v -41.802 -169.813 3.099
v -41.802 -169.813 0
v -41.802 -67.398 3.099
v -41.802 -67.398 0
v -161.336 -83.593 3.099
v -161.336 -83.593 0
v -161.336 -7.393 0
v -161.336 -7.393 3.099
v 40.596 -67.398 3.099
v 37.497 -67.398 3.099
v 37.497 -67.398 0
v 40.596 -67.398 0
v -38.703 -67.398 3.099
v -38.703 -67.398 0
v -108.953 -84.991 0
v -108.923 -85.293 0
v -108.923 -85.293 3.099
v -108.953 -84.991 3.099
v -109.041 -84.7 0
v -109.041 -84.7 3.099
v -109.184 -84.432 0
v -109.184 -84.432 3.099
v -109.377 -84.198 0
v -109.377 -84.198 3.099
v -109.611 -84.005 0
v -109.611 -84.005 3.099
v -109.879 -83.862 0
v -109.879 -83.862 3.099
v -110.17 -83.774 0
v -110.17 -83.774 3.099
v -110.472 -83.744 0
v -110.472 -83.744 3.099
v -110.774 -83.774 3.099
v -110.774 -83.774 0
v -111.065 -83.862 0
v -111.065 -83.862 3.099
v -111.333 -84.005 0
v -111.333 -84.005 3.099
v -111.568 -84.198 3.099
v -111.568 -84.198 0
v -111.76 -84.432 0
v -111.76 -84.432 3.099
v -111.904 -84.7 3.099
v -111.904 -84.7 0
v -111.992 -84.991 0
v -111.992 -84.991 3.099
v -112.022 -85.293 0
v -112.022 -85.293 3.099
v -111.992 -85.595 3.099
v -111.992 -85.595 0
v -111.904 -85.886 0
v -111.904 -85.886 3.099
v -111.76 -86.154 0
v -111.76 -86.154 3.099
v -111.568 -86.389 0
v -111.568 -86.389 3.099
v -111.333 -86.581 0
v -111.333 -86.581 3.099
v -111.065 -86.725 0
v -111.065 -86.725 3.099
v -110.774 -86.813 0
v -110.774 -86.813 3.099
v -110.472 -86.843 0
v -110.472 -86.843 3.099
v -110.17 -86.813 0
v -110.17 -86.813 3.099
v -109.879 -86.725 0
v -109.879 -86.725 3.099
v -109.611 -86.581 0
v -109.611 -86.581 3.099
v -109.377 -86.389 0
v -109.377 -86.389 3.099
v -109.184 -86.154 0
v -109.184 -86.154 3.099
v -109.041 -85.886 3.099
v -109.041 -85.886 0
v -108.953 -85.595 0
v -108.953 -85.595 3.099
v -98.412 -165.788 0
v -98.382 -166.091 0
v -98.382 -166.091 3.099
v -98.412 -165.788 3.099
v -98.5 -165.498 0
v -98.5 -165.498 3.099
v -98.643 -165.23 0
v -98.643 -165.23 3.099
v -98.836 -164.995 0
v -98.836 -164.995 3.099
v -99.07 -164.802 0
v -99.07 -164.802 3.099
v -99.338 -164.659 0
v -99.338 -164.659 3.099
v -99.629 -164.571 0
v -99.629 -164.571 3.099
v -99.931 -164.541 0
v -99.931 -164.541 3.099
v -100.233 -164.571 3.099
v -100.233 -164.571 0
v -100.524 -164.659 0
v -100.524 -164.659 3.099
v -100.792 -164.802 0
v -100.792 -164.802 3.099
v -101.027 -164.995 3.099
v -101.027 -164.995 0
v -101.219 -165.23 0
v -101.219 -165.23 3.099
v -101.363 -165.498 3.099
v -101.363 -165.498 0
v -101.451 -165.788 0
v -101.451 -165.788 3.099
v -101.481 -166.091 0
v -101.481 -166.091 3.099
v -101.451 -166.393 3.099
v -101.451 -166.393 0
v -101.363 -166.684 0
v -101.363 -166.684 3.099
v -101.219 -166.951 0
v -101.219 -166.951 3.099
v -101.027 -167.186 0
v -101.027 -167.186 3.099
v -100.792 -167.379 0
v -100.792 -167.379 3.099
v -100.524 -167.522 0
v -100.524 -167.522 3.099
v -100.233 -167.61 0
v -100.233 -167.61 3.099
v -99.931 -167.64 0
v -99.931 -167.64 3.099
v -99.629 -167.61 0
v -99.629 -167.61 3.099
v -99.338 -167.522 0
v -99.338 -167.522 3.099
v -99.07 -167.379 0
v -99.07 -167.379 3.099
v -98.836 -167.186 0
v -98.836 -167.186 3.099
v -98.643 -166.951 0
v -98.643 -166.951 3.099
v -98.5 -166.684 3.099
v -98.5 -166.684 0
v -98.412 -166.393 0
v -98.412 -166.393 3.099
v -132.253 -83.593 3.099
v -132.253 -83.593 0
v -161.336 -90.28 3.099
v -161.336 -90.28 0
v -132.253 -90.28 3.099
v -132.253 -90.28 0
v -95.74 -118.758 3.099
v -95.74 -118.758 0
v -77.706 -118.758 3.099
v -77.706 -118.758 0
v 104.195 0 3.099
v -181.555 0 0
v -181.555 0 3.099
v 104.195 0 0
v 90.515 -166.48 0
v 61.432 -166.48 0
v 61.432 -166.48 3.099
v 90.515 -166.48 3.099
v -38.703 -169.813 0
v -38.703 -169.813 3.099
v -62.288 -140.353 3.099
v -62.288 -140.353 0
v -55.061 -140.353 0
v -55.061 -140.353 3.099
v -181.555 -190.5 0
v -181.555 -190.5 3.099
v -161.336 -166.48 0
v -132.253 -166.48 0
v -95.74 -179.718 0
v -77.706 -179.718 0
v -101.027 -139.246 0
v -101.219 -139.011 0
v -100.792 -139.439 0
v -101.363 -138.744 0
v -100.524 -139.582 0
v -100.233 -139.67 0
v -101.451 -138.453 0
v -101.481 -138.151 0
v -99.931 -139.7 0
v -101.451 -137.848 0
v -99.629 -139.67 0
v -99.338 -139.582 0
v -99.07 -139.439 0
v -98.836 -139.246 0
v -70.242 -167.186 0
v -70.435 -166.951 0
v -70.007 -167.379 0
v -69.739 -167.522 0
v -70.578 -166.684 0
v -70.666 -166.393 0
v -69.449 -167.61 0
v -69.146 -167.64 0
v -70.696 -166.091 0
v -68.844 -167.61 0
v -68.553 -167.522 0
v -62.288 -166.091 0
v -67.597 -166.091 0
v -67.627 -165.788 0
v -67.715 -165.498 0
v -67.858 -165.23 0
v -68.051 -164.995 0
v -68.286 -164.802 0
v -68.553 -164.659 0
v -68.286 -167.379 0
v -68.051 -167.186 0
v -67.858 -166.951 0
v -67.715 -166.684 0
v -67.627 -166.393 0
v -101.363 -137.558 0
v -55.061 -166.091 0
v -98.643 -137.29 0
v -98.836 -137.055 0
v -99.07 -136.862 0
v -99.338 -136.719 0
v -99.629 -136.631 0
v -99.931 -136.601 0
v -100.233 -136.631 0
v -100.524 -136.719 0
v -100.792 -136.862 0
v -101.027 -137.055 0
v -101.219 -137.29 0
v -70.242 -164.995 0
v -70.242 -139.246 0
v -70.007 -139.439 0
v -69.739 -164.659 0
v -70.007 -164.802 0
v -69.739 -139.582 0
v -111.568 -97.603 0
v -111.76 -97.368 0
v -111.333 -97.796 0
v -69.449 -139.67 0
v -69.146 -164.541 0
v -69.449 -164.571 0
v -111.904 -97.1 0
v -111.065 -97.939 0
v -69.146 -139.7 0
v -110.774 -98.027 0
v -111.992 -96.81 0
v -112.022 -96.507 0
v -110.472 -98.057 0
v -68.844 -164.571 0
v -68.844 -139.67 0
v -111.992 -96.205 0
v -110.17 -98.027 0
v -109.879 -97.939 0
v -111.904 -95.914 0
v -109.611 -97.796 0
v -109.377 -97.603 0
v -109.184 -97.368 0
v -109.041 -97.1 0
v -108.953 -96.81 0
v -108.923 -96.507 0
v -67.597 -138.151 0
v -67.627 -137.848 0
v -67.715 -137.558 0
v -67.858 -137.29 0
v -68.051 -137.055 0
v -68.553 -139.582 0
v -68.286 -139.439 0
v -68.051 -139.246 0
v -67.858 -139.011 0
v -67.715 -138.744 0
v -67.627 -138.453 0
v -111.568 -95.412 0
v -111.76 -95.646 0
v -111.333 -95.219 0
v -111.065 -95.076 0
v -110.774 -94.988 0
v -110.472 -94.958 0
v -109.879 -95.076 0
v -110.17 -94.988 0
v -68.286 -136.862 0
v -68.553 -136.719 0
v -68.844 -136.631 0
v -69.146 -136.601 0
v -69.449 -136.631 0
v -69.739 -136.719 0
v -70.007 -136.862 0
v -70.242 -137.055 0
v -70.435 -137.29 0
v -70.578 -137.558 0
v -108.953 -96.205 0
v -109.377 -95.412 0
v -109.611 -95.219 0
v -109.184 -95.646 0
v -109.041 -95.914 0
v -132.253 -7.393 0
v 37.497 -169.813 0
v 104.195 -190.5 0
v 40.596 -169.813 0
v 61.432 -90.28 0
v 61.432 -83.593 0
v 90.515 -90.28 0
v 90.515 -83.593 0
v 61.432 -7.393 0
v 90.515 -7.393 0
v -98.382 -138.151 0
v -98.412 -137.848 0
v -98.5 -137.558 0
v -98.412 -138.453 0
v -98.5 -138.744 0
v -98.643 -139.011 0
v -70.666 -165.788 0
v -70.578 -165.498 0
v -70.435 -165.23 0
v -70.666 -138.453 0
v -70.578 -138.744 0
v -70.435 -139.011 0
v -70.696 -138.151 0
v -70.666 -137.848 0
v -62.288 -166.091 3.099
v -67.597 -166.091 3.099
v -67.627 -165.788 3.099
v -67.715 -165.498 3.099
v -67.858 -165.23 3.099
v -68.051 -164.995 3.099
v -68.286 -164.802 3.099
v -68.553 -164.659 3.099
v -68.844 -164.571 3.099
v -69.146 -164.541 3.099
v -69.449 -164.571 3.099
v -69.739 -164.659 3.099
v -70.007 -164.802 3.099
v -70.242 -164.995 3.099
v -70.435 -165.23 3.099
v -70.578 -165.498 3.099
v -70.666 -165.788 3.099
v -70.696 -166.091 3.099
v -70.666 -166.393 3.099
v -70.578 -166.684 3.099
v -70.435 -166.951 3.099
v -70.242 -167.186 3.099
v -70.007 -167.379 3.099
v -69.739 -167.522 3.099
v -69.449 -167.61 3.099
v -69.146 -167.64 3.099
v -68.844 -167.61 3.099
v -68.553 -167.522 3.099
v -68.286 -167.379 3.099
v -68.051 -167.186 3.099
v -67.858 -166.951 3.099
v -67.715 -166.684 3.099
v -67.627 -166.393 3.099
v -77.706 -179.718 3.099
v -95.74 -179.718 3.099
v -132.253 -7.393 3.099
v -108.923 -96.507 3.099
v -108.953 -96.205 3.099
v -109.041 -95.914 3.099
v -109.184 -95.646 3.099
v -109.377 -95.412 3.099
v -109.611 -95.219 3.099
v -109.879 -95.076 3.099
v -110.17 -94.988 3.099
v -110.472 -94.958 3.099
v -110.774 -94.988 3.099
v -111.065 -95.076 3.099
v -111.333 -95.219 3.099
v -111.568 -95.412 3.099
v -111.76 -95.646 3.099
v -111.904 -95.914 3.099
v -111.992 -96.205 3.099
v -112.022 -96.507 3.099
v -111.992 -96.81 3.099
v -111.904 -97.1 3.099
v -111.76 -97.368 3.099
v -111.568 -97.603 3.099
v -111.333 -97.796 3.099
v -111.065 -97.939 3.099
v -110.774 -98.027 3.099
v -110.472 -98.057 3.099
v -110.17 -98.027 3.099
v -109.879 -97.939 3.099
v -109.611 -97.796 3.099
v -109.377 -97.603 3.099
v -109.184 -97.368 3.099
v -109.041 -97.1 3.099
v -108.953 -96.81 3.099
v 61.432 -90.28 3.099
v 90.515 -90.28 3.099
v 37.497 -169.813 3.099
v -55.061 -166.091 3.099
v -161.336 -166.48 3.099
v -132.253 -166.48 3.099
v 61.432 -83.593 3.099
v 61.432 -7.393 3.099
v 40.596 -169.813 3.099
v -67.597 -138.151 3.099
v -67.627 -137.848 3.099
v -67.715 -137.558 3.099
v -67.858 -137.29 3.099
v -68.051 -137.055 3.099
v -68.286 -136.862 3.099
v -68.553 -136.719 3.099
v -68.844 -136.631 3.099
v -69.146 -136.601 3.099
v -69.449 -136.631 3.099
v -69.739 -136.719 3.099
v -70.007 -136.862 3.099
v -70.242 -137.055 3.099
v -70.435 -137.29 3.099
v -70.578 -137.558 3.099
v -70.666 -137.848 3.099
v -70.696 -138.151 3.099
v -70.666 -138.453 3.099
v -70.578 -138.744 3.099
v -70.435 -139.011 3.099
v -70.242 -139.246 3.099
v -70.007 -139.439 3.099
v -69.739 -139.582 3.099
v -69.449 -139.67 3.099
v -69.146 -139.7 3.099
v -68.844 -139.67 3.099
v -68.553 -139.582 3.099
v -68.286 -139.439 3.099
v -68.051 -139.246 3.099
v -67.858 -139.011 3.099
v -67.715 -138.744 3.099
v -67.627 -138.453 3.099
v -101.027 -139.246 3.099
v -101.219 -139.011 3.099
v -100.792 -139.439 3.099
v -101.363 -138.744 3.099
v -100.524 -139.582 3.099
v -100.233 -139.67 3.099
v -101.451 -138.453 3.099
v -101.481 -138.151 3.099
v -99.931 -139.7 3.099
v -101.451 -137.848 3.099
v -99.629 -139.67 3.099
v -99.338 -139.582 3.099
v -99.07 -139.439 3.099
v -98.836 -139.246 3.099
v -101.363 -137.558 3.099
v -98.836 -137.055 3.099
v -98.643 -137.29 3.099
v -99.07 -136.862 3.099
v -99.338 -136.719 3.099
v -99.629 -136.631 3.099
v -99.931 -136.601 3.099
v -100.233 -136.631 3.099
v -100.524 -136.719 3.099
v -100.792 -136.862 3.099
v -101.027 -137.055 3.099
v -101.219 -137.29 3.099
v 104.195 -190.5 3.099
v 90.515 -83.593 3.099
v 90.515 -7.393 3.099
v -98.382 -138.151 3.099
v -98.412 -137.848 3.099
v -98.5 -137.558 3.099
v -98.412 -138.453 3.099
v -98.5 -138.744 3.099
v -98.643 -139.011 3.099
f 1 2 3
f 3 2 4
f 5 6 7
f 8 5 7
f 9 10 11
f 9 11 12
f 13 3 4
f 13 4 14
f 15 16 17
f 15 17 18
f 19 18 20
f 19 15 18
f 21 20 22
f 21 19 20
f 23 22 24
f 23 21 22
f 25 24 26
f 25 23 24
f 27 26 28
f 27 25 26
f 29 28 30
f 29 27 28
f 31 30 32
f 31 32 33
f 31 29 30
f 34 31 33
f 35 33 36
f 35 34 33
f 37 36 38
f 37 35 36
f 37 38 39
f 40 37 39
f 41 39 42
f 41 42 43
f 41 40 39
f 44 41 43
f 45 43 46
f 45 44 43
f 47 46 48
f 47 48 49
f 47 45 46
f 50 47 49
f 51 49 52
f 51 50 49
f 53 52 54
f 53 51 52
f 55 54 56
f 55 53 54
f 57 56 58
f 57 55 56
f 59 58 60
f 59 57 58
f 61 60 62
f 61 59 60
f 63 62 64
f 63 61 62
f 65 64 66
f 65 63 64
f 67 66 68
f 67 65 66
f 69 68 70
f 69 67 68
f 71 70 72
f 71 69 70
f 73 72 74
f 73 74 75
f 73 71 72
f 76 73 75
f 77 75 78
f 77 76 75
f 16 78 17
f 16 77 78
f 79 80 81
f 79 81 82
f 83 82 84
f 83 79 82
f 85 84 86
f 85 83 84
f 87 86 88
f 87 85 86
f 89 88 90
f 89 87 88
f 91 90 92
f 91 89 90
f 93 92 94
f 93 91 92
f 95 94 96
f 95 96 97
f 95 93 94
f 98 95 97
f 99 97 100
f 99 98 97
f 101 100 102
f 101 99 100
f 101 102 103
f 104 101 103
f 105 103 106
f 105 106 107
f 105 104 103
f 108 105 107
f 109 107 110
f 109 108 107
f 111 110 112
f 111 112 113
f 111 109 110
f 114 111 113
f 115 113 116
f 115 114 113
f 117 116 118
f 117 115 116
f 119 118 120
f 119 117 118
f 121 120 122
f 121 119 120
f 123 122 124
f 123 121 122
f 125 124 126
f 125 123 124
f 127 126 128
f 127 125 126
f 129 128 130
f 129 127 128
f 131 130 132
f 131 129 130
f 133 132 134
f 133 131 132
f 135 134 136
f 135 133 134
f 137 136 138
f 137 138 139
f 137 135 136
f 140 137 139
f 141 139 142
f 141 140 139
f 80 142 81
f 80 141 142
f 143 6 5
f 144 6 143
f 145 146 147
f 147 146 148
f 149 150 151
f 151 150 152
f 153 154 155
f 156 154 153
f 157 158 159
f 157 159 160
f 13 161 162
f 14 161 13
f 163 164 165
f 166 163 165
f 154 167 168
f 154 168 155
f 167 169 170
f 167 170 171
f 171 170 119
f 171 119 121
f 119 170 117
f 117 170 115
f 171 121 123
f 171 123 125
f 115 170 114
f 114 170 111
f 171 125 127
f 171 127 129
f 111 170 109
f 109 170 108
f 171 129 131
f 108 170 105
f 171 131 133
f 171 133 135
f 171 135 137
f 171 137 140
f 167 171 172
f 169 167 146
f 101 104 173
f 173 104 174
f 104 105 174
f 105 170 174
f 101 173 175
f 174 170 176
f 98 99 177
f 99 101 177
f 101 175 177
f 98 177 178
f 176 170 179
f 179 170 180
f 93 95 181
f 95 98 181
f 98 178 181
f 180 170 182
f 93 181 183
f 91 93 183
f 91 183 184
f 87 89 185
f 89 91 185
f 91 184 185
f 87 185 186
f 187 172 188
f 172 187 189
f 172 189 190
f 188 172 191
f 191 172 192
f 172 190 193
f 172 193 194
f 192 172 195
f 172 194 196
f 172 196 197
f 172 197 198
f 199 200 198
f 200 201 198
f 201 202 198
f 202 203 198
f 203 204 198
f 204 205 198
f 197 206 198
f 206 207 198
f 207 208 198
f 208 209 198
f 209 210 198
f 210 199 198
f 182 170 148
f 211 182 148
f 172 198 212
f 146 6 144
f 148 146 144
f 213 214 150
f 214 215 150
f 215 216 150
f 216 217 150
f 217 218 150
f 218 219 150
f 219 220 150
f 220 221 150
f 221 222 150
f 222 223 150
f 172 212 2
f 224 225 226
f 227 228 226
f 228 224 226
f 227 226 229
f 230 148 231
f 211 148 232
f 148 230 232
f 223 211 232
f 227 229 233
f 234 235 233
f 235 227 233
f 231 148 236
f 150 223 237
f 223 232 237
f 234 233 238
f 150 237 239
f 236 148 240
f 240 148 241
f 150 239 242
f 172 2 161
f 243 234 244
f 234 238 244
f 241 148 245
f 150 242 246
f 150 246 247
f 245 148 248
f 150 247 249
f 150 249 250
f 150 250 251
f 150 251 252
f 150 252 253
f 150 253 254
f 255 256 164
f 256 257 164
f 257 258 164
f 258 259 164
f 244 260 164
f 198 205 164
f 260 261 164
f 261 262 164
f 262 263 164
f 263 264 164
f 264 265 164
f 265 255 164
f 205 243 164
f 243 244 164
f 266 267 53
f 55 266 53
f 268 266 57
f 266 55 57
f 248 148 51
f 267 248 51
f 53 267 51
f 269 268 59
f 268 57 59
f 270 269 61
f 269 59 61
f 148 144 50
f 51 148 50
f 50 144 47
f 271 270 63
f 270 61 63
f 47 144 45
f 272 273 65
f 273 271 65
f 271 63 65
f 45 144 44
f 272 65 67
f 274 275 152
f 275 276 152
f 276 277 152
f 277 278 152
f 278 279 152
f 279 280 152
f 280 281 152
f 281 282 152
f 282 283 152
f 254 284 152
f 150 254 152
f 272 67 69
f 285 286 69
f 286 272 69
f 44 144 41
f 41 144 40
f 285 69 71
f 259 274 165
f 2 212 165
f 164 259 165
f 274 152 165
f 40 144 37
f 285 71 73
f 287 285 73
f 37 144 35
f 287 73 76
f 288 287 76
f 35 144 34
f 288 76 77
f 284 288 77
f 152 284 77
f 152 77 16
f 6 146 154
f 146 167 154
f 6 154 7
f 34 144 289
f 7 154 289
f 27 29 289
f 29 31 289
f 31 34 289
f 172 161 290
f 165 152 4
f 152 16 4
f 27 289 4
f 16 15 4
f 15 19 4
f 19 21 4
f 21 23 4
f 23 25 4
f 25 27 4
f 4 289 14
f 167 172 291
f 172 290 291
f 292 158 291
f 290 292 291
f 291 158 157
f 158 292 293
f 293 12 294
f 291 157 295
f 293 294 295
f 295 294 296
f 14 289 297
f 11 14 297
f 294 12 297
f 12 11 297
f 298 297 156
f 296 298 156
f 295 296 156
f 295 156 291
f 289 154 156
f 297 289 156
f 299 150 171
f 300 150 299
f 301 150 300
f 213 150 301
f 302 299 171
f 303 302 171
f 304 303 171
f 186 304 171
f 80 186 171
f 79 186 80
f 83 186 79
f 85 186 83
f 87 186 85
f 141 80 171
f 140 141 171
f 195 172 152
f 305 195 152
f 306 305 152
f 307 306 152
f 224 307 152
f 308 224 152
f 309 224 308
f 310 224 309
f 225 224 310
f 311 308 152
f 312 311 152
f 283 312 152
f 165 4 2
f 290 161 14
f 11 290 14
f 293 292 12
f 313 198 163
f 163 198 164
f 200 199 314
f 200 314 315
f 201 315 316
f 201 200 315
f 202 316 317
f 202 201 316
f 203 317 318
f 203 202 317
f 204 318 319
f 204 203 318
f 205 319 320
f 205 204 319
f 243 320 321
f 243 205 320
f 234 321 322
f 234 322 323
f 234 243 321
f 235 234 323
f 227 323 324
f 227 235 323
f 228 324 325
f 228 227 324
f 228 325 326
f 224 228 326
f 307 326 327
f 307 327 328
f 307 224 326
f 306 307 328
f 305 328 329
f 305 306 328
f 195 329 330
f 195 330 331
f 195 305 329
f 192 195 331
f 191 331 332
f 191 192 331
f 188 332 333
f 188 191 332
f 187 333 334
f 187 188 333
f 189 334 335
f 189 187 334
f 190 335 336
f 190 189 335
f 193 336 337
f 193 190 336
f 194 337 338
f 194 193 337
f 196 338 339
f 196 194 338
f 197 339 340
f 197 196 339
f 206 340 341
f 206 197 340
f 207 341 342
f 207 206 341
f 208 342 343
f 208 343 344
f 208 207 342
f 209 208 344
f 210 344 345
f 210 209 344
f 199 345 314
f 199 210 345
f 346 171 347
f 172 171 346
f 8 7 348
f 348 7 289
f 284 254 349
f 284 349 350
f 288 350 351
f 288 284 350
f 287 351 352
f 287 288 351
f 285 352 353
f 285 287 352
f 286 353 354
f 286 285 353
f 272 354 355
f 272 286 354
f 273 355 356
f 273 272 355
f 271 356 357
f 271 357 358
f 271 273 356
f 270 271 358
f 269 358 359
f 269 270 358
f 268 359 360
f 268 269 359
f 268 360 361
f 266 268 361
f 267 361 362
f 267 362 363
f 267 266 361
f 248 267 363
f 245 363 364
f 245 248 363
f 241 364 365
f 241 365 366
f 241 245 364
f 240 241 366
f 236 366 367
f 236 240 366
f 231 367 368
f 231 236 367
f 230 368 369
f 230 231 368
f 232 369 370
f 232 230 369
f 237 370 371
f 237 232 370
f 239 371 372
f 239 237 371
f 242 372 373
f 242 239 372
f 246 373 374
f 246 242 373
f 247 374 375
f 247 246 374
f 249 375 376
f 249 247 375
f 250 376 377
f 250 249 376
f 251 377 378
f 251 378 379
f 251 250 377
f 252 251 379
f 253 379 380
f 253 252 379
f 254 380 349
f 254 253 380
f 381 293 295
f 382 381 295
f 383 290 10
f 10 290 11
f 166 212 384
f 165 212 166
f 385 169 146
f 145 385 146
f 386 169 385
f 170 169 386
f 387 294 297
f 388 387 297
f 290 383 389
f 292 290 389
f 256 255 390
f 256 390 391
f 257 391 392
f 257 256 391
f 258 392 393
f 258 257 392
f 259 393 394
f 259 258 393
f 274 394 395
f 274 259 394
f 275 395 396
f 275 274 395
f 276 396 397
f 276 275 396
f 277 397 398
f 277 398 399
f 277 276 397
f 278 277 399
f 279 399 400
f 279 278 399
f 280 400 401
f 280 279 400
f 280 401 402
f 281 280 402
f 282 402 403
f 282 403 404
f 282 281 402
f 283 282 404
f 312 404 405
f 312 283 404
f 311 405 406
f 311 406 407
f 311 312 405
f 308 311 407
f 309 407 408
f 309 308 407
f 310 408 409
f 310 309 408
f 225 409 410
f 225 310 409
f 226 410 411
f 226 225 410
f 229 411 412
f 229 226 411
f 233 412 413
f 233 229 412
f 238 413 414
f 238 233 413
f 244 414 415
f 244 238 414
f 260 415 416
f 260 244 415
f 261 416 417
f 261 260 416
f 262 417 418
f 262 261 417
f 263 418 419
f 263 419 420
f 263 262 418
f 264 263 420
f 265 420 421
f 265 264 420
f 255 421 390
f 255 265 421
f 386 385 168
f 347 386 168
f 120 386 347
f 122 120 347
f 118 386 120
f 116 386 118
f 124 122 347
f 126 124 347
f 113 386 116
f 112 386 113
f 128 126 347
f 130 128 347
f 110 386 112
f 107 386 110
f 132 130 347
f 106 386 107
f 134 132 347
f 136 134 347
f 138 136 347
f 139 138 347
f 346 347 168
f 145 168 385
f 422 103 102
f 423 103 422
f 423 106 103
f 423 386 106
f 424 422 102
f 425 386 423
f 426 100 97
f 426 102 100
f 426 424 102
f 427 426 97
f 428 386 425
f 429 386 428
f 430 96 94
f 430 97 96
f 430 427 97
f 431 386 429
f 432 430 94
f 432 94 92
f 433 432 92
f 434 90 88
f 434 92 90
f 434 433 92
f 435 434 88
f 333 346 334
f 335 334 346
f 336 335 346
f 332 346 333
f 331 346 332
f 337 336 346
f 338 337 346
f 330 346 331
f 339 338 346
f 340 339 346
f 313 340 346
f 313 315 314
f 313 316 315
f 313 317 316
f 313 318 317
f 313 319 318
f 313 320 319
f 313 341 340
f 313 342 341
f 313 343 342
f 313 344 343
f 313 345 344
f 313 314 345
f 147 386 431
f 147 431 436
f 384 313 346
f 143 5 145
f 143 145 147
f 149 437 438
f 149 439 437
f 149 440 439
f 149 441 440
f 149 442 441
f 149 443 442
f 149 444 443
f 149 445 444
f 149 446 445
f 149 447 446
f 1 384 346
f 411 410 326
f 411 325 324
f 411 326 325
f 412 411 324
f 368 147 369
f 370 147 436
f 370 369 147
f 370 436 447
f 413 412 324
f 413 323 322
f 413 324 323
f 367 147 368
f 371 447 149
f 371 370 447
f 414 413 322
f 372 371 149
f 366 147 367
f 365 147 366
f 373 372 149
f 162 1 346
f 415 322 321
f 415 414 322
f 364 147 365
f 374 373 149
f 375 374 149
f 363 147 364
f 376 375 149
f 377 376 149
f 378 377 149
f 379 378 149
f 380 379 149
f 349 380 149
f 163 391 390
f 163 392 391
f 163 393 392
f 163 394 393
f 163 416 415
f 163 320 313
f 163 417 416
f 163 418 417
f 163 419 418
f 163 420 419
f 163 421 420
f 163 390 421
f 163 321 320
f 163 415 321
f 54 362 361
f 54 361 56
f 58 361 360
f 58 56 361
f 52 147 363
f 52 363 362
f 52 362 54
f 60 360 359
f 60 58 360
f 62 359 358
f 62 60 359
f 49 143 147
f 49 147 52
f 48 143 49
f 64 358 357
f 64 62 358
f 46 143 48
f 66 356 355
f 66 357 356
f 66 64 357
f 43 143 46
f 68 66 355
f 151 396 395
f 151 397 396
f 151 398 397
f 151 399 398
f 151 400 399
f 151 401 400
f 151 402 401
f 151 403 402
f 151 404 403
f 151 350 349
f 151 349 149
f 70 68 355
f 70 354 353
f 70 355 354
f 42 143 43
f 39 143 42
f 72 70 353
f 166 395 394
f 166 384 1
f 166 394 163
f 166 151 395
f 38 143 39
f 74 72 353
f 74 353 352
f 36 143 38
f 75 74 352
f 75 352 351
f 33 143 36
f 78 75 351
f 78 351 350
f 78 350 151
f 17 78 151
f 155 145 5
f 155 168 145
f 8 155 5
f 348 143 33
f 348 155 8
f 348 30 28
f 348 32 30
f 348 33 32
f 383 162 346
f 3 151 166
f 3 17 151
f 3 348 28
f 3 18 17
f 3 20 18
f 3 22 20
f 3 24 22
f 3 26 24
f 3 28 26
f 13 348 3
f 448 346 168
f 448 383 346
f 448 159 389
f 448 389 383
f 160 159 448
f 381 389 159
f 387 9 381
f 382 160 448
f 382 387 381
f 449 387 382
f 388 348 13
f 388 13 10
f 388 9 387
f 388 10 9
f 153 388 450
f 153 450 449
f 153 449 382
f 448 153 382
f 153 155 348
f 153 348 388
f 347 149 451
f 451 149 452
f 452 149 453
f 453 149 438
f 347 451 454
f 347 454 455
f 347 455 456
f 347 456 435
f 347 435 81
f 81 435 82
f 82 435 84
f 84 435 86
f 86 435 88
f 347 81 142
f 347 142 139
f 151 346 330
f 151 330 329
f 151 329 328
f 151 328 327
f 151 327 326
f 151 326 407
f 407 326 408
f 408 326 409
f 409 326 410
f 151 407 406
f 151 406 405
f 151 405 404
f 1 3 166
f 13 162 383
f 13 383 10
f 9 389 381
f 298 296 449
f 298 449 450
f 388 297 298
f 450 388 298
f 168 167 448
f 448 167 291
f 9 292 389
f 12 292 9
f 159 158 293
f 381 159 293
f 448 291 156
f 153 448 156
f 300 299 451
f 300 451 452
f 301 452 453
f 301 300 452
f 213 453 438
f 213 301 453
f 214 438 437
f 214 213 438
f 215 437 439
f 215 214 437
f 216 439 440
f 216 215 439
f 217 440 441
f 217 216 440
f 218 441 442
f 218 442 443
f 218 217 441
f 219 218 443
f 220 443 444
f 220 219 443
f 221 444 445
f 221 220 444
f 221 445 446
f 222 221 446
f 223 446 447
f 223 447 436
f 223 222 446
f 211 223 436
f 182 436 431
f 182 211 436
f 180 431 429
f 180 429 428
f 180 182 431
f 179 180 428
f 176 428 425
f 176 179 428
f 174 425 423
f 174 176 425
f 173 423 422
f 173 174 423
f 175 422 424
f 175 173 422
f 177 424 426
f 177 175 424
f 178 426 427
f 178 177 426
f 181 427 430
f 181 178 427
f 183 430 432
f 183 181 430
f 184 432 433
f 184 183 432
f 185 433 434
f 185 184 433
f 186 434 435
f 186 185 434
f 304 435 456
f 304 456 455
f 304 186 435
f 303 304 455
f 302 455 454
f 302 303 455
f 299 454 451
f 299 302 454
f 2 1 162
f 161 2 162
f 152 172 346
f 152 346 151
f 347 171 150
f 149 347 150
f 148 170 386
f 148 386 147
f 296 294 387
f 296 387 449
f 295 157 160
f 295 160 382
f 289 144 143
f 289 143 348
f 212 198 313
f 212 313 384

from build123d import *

# Parameters (mm, degrees)
F1_W     = 285.75
F1_H     = 190.5
F1_R     = 1.5494
F1_W_2   = 18.034
F1_H_2   = 60.96
F1_W_3   = 7.226892
F1_H_3   = 25.737308
F1_W_4   = 29.083
F1_H_4   = 76.2
F1_W_5   = 3.0988
F1_H_5   = 102.414822
F2_DEPTH = 3.0988


with BuildPart() as f2:
    # F1 (on face) → F2 (new body)
    with BuildSketch(Plane.XY):
        with Locations((-38.680092, -95.25)):
            Rectangle(F1_W, F1_H)
        with Locations((-99.931192, -166.0906)):
            Circle(F1_R, mode=Mode.SUBTRACT)
        with Locations((-86.723192, -149.2377)):
            Rectangle(F1_W_2, F1_H_2, mode=Mode.SUBTRACT)
        with Locations((-69.146392, -166.0906)):
            Circle(F1_R, mode=Mode.SUBTRACT)
        with Locations((-58.674946, -153.221946)):
            Rectangle(F1_W_3, F1_H_3, mode=Mode.SUBTRACT)
        with Locations((-146.794192, -128.380313)):
            Rectangle(F1_W_4, F1_H_4, mode=Mode.SUBTRACT)
        with Locations((-110.472192, -96.5073)):
            Circle(F1_R, mode=Mode.SUBTRACT)
        with Locations((-99.931192, -138.1506)):
            Circle(F1_R, mode=Mode.SUBTRACT)
        with Locations((-69.146392, -138.1506)):
            Circle(F1_R, mode=Mode.SUBTRACT)
        with Locations((-40.252562, -118.60587)):
            Rectangle(F1_W_5, F1_H_5, mode=Mode.SUBTRACT)
        with Locations((75.973835, -128.380313)):
            Rectangle(F1_W_4, F1_H_4, mode=Mode.SUBTRACT)
        with Locations((39.046238, -118.60587)):
            Rectangle(F1_W_5, F1_H_5, mode=Mode.SUBTRACT)
        with Locations((-110.472192, -85.2932)):
            Circle(F1_R, mode=Mode.SUBTRACT)
        with Locations((-146.794192, -45.493023)):
            Rectangle(F1_W_4, F1_H_4, mode=Mode.SUBTRACT)
        with Locations((75.973835, -45.493023)):
            Rectangle(F1_W_4, F1_H_4, mode=Mode.SUBTRACT)
    extrude(amount=F2_DEPTH)


solid = f2.part
